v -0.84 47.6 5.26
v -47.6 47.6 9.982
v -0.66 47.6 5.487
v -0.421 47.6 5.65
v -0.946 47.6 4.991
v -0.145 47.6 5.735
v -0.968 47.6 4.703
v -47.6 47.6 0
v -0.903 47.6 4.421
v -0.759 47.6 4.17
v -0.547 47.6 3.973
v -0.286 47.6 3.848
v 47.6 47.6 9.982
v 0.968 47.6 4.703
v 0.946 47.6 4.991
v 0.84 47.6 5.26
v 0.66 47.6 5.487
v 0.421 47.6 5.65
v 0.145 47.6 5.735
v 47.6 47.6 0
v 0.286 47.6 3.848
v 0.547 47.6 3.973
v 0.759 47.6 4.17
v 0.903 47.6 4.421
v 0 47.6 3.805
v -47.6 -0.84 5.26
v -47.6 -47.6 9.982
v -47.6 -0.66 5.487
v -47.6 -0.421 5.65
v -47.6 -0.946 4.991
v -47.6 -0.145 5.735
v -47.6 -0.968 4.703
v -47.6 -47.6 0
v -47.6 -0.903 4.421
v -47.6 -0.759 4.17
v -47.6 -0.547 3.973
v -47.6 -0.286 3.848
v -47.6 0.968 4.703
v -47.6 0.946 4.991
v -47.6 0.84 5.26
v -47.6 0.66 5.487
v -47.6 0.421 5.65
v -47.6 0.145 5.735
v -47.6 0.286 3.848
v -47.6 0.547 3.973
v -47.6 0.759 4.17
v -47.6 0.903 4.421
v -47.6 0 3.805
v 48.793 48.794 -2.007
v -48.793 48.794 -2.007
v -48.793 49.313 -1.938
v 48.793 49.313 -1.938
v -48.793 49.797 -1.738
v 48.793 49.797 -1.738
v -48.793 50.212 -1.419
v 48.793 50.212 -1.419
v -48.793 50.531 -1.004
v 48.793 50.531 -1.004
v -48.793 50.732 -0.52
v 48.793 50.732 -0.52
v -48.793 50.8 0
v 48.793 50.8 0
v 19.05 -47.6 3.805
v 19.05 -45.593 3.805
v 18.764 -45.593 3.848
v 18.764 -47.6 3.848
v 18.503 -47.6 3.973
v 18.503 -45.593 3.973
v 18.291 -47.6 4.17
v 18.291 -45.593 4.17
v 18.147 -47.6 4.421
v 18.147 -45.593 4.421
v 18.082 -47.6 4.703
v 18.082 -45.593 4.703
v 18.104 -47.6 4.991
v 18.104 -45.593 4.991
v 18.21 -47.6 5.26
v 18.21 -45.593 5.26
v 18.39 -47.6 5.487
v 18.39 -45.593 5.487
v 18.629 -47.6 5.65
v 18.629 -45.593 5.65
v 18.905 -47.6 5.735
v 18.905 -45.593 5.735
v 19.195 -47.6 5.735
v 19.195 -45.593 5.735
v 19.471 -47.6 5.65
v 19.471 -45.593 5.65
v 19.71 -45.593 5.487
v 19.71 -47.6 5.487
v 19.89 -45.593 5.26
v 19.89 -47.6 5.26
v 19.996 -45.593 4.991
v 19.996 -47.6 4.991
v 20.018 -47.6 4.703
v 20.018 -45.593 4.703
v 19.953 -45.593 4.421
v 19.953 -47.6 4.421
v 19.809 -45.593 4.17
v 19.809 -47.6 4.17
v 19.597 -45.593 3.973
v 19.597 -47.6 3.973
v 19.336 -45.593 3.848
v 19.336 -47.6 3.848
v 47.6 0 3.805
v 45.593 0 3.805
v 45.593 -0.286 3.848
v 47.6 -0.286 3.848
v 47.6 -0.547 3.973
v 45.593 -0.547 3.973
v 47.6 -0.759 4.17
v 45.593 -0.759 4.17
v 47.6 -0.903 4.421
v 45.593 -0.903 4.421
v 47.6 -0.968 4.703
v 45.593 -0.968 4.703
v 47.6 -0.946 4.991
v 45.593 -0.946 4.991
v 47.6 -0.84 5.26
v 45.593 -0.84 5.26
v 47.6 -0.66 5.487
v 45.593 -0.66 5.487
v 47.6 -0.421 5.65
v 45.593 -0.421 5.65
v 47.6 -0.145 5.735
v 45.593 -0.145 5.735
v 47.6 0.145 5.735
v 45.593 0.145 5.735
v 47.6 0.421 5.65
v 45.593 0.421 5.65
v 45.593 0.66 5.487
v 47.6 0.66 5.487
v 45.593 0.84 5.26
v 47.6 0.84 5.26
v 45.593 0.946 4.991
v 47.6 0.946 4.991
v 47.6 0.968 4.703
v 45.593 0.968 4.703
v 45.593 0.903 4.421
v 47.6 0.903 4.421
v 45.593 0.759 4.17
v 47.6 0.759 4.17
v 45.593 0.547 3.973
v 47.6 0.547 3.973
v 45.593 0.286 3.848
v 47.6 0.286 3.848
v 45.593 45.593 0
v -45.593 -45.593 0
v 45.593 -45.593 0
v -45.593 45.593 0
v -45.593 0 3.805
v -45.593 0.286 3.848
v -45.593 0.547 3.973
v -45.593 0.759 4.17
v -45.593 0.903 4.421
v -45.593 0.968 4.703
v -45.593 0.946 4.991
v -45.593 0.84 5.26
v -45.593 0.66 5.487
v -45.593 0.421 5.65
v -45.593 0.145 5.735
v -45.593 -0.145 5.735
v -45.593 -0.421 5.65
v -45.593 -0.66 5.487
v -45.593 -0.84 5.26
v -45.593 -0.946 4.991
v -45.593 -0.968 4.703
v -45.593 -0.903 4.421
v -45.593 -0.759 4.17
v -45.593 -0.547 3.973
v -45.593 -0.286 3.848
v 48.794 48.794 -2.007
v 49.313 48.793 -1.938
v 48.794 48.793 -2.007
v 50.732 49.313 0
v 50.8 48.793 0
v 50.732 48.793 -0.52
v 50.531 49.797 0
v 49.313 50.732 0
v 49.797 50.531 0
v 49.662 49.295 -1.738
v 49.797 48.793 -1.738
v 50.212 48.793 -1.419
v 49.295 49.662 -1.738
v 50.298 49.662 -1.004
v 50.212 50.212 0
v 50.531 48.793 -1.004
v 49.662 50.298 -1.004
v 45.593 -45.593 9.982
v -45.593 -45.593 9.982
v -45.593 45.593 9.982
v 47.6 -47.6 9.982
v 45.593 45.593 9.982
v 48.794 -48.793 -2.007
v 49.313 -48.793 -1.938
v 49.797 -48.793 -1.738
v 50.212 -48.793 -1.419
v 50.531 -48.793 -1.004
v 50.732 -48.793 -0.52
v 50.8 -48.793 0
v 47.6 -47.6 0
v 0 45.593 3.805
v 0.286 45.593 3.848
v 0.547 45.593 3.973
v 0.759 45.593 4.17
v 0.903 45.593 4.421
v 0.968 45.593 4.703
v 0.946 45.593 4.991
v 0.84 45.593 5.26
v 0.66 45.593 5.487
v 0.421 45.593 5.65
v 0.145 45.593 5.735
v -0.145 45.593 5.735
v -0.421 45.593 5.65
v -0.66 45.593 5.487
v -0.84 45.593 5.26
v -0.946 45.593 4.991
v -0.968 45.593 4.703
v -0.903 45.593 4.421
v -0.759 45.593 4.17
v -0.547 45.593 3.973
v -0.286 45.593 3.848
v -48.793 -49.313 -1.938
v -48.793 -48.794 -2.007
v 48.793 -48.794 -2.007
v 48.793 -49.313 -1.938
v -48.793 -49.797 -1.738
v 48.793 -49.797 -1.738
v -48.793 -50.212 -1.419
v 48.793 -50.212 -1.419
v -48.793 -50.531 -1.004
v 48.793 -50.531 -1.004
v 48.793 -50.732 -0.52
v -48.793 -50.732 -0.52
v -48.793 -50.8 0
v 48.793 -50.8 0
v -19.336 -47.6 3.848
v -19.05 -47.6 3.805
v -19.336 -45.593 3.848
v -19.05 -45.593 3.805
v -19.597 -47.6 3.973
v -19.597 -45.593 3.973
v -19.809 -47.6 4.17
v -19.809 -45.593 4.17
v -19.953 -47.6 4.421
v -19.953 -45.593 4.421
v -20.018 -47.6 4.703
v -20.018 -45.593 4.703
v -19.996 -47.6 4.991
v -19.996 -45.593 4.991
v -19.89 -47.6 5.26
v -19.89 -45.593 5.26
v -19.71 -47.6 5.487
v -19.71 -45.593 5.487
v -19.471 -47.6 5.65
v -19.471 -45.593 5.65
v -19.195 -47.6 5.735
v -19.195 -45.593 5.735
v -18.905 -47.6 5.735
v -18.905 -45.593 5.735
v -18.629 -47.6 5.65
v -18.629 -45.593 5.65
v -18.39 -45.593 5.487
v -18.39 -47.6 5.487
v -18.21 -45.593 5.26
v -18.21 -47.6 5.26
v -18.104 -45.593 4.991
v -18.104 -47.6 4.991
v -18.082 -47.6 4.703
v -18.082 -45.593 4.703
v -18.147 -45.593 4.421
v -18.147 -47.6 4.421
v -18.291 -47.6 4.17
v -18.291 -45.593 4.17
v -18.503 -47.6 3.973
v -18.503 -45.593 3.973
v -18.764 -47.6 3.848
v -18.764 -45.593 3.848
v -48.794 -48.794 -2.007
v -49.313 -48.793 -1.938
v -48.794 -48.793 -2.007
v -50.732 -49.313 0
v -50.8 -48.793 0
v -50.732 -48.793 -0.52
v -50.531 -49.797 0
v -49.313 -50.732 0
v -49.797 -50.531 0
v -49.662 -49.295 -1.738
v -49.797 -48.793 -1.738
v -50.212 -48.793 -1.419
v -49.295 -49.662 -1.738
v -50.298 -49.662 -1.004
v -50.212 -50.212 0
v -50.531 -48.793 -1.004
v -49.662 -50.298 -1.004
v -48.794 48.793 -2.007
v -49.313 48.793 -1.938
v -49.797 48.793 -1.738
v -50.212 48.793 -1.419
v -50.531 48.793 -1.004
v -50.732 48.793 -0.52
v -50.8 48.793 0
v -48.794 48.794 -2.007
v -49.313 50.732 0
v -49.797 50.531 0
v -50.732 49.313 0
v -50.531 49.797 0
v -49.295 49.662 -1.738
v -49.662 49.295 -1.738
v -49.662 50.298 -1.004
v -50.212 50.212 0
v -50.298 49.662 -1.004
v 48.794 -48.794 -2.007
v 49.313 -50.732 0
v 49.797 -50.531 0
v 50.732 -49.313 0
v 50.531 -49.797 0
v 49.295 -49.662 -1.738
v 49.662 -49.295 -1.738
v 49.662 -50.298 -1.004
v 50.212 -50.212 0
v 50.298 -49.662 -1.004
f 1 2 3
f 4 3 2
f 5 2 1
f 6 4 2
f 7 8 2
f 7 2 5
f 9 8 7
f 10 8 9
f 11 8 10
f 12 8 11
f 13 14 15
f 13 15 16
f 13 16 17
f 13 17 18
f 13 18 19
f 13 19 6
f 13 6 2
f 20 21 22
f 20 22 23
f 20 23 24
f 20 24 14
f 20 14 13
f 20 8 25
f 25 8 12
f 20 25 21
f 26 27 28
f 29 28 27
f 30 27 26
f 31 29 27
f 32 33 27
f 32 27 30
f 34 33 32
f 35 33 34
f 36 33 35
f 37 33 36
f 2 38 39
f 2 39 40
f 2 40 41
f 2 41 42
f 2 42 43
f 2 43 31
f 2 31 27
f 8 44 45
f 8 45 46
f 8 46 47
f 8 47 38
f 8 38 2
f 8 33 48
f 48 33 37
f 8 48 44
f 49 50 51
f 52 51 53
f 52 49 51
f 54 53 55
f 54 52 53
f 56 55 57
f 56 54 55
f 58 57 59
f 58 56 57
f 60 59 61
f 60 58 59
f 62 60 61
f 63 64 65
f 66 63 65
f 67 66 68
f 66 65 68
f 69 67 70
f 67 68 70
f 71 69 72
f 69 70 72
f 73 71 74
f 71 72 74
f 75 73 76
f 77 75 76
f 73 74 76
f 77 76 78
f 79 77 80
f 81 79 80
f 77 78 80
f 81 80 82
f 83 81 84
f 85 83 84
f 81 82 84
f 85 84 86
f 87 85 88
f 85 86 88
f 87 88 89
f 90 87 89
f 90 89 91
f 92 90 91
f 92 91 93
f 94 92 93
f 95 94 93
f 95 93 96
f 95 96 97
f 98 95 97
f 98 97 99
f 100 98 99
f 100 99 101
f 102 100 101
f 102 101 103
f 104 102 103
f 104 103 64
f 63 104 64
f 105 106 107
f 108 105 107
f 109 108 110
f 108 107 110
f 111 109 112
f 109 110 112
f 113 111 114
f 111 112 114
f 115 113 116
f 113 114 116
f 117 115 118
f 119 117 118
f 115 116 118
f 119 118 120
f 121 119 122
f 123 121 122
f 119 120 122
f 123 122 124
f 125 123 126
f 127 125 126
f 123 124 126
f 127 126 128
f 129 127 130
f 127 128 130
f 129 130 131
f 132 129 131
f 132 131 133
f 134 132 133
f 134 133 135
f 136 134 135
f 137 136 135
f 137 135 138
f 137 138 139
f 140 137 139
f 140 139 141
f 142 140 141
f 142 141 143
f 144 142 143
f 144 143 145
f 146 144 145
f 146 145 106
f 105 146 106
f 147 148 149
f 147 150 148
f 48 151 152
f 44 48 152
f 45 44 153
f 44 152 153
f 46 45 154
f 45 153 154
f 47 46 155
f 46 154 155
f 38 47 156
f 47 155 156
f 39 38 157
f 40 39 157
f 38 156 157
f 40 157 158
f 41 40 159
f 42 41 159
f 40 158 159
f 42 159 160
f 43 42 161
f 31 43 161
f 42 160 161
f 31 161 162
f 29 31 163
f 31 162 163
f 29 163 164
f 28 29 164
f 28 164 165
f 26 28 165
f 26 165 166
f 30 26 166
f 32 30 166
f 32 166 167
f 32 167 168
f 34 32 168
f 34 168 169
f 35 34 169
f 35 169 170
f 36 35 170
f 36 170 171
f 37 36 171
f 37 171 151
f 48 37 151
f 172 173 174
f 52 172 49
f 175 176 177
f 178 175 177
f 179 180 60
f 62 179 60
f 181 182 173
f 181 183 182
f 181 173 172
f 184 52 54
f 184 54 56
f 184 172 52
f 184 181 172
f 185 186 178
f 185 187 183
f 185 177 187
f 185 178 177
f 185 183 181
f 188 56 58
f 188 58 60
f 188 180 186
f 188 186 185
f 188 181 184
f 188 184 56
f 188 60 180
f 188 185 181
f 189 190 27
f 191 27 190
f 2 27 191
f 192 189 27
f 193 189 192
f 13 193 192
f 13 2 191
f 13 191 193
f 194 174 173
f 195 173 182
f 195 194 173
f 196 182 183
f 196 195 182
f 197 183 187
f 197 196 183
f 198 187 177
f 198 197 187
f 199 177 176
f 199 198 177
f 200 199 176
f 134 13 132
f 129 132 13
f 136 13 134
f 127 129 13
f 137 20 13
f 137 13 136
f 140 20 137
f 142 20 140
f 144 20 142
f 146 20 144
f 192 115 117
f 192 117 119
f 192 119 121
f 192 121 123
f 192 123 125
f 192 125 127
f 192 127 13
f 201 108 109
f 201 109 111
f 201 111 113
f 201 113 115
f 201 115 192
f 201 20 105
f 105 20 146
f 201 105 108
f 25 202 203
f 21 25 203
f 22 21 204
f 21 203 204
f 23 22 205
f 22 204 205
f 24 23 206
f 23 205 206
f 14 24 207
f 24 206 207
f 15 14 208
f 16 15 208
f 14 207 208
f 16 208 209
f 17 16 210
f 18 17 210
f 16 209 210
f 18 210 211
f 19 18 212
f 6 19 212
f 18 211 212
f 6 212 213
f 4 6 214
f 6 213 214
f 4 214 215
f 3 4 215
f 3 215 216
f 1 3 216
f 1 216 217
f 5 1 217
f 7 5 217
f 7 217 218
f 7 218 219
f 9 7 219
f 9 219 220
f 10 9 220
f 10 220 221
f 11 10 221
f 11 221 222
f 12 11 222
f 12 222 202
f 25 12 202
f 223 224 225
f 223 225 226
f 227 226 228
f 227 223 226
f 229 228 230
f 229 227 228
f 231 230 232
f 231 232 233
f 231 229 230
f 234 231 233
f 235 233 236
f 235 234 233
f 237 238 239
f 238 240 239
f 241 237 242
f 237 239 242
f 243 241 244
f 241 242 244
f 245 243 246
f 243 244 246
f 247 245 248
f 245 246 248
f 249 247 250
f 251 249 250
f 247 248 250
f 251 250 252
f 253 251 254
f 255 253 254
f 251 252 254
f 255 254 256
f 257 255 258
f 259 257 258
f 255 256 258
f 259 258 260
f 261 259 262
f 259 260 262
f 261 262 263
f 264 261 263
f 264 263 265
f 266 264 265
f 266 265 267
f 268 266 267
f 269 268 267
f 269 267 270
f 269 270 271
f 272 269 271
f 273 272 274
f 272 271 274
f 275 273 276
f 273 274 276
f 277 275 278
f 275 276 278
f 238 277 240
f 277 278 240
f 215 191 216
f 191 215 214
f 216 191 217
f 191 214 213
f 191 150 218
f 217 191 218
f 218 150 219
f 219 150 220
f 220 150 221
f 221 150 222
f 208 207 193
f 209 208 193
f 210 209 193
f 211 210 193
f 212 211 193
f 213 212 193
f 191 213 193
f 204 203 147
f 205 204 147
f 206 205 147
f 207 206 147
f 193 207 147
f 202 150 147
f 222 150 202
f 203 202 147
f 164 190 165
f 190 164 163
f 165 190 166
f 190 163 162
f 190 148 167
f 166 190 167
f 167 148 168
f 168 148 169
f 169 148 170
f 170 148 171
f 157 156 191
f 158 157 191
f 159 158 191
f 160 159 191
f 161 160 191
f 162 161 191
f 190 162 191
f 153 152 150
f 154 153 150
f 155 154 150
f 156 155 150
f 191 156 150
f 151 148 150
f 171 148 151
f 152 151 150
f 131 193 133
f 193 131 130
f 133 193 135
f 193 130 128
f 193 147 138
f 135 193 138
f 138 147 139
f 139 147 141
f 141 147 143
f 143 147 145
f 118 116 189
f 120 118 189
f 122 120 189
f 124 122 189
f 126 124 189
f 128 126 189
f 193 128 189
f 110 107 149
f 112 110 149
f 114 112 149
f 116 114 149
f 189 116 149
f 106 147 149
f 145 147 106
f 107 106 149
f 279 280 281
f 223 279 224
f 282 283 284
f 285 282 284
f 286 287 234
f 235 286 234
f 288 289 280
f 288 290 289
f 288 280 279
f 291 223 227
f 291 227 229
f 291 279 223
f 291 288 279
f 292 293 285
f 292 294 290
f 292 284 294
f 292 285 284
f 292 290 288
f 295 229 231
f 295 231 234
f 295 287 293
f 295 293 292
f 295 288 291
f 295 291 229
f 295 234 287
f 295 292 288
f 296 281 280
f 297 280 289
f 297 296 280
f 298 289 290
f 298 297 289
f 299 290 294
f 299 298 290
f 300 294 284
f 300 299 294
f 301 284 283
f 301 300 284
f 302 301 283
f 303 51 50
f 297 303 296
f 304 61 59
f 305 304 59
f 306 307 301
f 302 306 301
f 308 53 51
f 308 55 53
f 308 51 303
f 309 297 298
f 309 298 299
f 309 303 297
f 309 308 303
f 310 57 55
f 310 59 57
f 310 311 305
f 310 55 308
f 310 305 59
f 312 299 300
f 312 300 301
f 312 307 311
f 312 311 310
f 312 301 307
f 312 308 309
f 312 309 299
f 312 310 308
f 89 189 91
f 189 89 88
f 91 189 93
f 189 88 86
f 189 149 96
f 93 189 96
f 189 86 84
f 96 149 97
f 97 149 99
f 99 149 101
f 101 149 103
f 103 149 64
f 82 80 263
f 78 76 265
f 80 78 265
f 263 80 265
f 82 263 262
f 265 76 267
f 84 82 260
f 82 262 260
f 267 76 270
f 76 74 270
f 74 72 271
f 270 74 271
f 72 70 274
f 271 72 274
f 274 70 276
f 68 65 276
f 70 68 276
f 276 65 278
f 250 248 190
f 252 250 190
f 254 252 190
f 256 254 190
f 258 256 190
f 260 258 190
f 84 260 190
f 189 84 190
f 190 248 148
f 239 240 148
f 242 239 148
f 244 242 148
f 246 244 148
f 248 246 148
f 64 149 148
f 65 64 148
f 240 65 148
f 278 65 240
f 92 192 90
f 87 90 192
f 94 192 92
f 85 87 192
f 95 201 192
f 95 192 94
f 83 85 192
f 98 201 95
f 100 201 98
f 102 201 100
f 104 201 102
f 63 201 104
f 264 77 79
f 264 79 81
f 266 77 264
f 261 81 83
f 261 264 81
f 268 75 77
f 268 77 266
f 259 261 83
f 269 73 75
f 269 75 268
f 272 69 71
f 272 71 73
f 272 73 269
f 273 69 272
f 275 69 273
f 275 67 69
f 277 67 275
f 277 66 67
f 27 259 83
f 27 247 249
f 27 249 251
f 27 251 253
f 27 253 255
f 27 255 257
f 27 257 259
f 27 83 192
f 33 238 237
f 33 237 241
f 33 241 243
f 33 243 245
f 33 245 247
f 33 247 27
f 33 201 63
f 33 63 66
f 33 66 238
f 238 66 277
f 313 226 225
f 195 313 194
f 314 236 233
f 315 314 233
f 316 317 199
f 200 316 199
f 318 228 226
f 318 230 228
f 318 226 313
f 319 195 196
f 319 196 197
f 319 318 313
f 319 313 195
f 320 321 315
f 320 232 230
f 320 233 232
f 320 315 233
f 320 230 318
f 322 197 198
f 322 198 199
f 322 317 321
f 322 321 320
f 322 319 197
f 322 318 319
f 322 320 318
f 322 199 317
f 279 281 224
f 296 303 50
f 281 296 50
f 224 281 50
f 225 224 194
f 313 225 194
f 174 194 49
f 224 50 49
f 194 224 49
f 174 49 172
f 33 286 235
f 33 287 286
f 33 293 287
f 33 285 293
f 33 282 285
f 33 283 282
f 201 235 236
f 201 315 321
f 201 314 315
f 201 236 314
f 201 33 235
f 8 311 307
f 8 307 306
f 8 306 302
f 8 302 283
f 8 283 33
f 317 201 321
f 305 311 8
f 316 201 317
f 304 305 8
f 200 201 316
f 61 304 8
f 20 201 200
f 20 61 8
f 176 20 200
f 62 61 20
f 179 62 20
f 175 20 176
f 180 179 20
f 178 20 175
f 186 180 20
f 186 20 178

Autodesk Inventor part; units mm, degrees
ref_plane "YZ Plane" through (0, 0, 0) normal (1, 0, 0) x (0, 1, 0)
ref_plane "XZ Plane" through (0, 0, 0) normal (0, 1, 0) x (-1, 0, 0)
ref_plane "XY Plane" through (0, 0, 0) normal (0, 0, 1) x (1, 0, 0)
sketch "Skizze1" plane through (0, 0, 0) normal (0, 0, 1) x (1, 0, 0)
  line L0 (-50.8, 50.8) -> (50.8, 50.8)
  line L1 (50.8, 50.8) -> (50.8, -50.8)
  line L2 (50.8, -50.8) -> (-50.8, -50.8)
  line L3 (-50.8, -50.8) -> (-50.8, 50.8)
  line L4 (50.8, -50.8) -> (-50.8, 50.8) construction
  point P0 (0, 0)
  point P1 (0, 0)
  dimension "d0" = 101.6
  dimension "d1" = 101.6
extrude "Extrusion1" add sketch "Skizze1" against normal blind 2.0066
fillet "Rundung1" radius 2.0066 4 edges at (50.8, -50.8, -1.0033) (50.8, 50.8, -1.0033) (-50.8, 50.8, -1.0033) (-50.8, -50.8, -1.0033)
fillet "Rundung2" radius 2.0066 8 edges at (-50.2123, -50.2123, -2.0066) (-50.8, 0, -2.0066) (-50.2123, 50.2123, -2.0066) (0, 50.8, -2.0066) (50.2123, 50.2123, -2.0066) (50.8, 0, -2.0066) (50.2123, -50.2123, -2.0066) (0, -50.8, -2.0066)
sketch "Skizze2" plane through (0, 0, 0) normal (0, 0, 1) x (1, 0, 0)
  line L0 (-47.5996, 47.5996) -> (47.5996, 47.5996)
  line L1 (47.5996, 47.5996) -> (47.5996, -47.5996)
  line L2 (47.5996, -47.5996) -> (-47.5996, -47.5996)
  line L3 (-47.5996, -47.5996) -> (-47.5996, 47.5996)
  line L4 (47.5996, -47.5996) -> (-47.5996, 47.5996) construction
  line L5 (-45.593, 45.593) -> (45.593, 45.593)
  line L6 (45.593, 45.593) -> (45.593, -45.593)
  line L7 (45.593, -45.593) -> (-45.593, -45.593)
  line L8 (-45.593, -45.593) -> (-45.593, 45.593)
  line L9 (-45.593, -45.593) -> (45.593, 45.593) construction
  point P0 (0, 0)
  point P1 (0, 0)
  dimension "d6" = 95.1992
  dimension "d7" = 2.0066
extrude "Extrusion2" add sketch "Skizze2" along normal blind 9.9822
sketch "Skizze3" plane through (47.5996, -47.5996, 0) normal (1, 0, 0) x (0, 0, -1)
  line L0 (0, 95.1992) -> (0, 0) projected
  line L1 (0, 95.1992) -> (-9.9822, 95.1992) projected
  line L2 (-9.9822, 0) -> (-9.9822, 95.1992) projected
  line L3 (0, 0) -> (-9.9822, 0) projected
  line L4 (0, 47.5996) -> (-4.7752, 47.5996) construction
  line L5 (0, 95.1992) -> (0, 0) construction
  dimension "d10" = 4.7752
hole "Bohrung1" at (47.5996, 0, 4.7752) direction (-1, 0, 0) diameter 1.941 depth 7.675 tip angle 118 thread size "3-48 UNC" class "2B" standard "ANSI Unified Screw Threads"
pattern_circular "Runde Anordnung1" count 3 over 180 about axis through (0, 0, -10) along (0, 0, 1) of "Bohrung1"
sketch "Skizze4" plane through (-47.5996, -47.5996, 0) normal (0, -1, 0) x (1, 0, 0)
  line L0 (95.1992, 0) -> (0, 0) projected
  line L1 (95.1992, 0) -> (95.1992, 9.9822) projected
  line L2 (0, 9.9822) -> (95.1992, 9.9822) projected
  line L3 (0, 0) -> (0, 9.9822) projected
  line L4 (47.5996, 0) -> (47.5996, 4.7752) construction
  line L5 (28.5496, 4.7752) -> (66.6496, 4.7752) construction
  dimension "d21" = 4.7752
  dimension "d22" = 38.1
hole "Bohrung2" at (-19.05, -47.5996, 4.7752) at (19.05, -47.5996, 4.7752) direction (0, 1, 0) diameter 1.941 depth 7.675 tip angle 118 thread size "3-48 UNC" class "2B" standard "ANSI Unified Screw Threads"
properties part number "Nanolab CubeDeckel 1"
